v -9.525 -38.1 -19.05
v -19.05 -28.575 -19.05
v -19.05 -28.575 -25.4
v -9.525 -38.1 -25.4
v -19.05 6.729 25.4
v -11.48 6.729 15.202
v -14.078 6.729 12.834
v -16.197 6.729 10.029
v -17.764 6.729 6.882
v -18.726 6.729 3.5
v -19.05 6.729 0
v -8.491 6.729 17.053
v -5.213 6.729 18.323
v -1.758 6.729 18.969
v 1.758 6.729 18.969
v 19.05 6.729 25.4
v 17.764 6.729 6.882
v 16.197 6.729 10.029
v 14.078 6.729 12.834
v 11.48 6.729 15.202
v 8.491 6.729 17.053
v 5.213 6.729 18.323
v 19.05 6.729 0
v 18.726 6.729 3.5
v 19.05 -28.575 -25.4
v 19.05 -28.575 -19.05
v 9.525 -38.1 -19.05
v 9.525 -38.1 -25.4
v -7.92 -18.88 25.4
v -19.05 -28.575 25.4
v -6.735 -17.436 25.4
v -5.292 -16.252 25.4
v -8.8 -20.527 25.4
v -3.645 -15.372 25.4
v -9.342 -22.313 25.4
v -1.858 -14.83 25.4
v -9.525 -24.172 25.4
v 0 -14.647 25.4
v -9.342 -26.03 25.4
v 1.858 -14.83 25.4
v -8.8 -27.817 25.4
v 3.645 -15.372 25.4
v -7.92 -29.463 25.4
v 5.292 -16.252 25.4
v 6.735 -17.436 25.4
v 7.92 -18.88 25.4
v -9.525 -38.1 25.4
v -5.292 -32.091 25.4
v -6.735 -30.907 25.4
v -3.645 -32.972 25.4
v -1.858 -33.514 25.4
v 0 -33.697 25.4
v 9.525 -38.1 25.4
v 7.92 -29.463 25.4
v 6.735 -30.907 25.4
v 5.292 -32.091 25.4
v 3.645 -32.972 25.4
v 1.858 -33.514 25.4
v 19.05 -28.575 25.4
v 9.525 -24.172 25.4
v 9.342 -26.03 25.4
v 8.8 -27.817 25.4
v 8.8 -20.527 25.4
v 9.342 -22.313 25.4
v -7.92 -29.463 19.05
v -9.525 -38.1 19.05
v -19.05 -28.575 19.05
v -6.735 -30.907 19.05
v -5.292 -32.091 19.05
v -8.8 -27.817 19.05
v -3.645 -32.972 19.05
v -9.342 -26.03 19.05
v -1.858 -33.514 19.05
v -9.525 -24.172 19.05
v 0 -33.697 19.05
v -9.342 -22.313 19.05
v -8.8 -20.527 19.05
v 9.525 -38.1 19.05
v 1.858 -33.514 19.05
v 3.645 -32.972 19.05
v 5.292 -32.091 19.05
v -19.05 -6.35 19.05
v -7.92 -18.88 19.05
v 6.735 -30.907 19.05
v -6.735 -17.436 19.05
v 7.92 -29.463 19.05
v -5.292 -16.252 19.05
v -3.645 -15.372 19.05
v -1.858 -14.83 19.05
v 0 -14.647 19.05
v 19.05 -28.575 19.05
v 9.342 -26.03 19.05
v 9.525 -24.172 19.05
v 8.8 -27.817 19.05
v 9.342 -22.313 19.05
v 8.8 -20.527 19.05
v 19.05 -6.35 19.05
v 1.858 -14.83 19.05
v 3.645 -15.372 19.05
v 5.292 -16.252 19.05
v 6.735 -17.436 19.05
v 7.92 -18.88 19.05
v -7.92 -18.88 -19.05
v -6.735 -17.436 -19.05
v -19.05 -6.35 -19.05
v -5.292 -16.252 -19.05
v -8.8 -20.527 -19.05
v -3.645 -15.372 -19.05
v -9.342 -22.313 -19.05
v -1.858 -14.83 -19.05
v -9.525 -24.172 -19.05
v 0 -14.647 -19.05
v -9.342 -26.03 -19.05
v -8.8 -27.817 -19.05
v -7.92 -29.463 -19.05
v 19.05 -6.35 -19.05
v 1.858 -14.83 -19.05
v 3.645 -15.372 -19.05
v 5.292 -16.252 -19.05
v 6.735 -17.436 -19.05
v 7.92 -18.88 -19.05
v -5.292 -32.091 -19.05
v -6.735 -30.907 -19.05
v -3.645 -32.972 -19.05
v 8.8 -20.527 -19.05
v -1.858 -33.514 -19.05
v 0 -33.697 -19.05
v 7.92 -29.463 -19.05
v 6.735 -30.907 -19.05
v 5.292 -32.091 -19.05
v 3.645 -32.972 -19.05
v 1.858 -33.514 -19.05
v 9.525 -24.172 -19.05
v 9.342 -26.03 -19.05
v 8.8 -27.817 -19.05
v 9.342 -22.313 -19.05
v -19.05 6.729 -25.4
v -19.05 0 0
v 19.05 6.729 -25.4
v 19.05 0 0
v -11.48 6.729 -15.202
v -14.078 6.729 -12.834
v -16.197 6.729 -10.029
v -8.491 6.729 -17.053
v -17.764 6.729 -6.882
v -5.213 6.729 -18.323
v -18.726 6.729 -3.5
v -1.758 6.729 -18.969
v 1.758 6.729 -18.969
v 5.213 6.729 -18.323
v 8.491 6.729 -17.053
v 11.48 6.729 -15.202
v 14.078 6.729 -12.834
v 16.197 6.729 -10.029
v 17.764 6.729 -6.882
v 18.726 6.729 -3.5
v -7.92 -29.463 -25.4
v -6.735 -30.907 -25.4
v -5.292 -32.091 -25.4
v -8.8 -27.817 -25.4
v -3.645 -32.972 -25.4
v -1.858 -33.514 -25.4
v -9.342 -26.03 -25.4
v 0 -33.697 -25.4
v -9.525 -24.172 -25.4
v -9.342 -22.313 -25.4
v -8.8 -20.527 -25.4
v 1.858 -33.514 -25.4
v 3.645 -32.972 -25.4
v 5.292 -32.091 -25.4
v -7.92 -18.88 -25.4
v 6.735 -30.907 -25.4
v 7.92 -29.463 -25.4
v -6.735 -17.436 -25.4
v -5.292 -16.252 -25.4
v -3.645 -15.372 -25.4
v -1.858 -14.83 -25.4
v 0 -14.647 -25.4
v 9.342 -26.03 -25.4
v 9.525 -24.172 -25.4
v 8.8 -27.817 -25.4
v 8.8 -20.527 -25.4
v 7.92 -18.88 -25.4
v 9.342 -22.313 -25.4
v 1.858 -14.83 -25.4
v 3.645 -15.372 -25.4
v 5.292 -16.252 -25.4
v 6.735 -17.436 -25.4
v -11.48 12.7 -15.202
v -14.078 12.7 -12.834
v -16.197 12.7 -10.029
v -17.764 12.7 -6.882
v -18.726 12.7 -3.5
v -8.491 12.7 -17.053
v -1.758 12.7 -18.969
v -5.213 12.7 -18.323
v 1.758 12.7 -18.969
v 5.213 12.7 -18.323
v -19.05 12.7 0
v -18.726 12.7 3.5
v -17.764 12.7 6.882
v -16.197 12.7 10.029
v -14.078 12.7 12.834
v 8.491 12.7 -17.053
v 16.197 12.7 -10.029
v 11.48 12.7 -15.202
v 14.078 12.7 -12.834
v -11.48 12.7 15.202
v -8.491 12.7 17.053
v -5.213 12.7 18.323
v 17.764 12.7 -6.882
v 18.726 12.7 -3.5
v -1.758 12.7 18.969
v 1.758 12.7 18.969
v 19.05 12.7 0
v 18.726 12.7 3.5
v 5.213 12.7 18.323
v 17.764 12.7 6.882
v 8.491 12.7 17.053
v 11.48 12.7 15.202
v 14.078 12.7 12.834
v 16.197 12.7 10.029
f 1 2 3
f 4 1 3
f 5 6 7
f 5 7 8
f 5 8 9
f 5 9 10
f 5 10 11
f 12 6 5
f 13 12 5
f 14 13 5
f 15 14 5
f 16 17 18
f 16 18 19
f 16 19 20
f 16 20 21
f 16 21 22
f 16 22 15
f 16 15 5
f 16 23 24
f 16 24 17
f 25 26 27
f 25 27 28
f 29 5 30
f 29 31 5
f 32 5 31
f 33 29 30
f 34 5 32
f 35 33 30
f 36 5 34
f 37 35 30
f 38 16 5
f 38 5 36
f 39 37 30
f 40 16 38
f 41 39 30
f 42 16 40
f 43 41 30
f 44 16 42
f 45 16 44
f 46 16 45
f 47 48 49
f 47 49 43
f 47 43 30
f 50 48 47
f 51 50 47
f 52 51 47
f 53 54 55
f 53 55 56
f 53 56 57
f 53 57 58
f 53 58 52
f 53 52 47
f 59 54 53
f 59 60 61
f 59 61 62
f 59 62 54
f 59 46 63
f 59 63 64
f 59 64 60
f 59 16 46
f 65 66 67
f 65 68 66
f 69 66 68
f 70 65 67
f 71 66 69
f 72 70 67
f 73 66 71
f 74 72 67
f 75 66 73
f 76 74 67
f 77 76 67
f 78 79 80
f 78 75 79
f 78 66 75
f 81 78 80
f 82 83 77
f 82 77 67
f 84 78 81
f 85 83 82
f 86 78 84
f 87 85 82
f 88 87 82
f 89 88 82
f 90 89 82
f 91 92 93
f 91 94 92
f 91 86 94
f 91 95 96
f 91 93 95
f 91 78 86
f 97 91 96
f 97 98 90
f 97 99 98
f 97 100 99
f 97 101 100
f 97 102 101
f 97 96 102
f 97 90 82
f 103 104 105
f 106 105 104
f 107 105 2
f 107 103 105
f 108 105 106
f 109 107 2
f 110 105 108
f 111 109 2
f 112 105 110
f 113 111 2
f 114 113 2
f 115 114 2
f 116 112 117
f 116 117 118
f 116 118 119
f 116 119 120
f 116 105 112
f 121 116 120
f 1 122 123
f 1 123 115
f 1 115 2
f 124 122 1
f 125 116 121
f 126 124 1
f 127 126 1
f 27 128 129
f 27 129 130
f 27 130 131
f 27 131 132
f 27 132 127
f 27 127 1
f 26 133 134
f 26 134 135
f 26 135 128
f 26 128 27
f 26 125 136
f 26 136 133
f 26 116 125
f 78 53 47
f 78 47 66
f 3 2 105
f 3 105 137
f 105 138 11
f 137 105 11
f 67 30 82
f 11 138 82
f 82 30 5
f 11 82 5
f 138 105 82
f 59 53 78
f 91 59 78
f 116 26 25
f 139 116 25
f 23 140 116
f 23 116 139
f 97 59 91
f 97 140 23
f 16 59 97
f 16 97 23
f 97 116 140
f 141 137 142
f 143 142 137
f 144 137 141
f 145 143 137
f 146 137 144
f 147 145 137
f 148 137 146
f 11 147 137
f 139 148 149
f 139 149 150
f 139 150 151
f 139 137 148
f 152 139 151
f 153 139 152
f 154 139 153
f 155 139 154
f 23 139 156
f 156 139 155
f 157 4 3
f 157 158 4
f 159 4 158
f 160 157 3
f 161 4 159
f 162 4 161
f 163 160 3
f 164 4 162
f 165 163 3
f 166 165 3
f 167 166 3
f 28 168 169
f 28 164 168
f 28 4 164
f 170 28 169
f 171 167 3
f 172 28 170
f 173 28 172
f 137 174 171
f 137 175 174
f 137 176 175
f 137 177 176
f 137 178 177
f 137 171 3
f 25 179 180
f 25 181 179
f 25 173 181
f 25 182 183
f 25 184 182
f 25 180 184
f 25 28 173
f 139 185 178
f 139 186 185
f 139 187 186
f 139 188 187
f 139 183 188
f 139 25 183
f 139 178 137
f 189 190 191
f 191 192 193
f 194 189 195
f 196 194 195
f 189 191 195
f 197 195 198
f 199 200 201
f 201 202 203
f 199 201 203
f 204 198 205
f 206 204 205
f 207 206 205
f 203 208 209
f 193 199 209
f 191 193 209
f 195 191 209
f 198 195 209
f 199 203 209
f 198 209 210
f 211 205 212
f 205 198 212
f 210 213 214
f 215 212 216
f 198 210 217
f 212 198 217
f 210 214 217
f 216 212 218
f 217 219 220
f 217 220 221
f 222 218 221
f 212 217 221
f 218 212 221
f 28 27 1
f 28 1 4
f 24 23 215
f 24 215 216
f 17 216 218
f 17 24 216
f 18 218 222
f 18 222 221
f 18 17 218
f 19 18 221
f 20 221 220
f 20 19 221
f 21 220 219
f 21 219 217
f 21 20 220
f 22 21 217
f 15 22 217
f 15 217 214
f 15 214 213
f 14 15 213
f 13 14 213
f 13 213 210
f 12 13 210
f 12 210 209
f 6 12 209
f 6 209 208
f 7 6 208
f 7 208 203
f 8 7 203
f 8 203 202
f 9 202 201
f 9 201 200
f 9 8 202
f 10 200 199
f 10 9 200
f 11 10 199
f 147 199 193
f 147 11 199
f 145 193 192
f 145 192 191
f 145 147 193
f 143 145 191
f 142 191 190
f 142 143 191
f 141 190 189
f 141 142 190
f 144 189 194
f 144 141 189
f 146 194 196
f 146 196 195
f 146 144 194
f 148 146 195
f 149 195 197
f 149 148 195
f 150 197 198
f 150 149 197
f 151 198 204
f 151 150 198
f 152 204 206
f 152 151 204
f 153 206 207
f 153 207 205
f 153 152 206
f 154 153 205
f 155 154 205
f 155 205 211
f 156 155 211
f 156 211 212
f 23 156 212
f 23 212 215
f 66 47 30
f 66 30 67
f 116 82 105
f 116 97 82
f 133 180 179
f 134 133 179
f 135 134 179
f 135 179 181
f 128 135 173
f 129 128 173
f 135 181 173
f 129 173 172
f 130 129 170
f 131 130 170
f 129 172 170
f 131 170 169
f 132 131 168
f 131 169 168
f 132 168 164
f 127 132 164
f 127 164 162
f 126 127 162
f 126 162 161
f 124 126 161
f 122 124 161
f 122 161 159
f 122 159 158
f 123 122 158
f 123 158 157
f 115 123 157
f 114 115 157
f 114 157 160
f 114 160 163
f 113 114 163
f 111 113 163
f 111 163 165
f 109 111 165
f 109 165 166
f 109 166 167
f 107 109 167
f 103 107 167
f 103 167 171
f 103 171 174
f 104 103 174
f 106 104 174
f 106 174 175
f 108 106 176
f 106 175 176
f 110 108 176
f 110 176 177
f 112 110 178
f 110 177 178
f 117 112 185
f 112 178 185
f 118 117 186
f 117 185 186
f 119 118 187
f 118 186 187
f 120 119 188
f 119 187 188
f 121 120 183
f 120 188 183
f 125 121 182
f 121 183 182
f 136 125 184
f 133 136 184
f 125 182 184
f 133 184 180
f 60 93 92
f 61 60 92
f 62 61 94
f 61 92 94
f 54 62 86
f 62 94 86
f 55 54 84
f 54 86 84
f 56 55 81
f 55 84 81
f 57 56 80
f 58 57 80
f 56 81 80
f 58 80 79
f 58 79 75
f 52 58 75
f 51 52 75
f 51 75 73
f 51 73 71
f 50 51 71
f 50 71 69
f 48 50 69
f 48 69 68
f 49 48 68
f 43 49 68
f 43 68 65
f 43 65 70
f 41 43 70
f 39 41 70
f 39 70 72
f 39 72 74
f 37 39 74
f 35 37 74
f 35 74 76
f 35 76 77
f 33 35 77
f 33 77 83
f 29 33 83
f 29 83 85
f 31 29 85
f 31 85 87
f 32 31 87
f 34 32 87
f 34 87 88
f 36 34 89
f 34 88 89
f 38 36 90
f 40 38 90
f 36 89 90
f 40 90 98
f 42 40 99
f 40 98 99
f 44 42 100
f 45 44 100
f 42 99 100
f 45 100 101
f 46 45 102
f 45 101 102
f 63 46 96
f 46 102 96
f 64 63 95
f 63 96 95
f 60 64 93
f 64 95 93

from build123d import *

# Parameters (mm, degrees)
F2_DEPTH = 19.05
F3_R     = 9.525
F4_DEPTH = 50.801
F5_SIZE  = 9.525
F0_R     = 19.05
F6_DEPTH = 12.7


with BuildPart() as f2:
    # F1 (on Right) → F2 (new body, symmetric)
    with BuildSketch(Plane.YZ):
        Polygon((-38.1, -19.05), (-38.1, -25.4), (6.7289513536, -25.4), (6.7289513536, 25.4), (-38.1, 25.4), (-38.1, 19.05), (-6.35, 19.05), (-6.35, -19.05), align=None)
    extrude(amount=F2_DEPTH, both=True)

    # F3 (on face) → F4 (cut, through all)
    with BuildSketch(Plane(origin=(0, 0, -25.4), x_dir=(1, 0, 0), z_dir=(0, 0, -1))):
        with Locations((0, 24.1716690361)):
            Circle(F3_R)
    extrude(amount=-F4_DEPTH, mode=Mode.SUBTRACT)

    # F5
    f5_edges = [f2.edges().sort_by_distance(p)[0] for p in [
        (-19.05, -38.1, 22.225),
        (19.05, -38.1, 22.225),
        (-19.05, -38.1, -22.225),
        (19.05, -38.1, -22.225),
    ]]
    chamfer(f5_edges, length=F5_SIZE)

    # F0 (on Front) → F6 (join)
    with BuildSketch(Plane.XZ):
        Circle(F0_R)
    extrude(amount=-F6_DEPTH)


solid = f2.part
